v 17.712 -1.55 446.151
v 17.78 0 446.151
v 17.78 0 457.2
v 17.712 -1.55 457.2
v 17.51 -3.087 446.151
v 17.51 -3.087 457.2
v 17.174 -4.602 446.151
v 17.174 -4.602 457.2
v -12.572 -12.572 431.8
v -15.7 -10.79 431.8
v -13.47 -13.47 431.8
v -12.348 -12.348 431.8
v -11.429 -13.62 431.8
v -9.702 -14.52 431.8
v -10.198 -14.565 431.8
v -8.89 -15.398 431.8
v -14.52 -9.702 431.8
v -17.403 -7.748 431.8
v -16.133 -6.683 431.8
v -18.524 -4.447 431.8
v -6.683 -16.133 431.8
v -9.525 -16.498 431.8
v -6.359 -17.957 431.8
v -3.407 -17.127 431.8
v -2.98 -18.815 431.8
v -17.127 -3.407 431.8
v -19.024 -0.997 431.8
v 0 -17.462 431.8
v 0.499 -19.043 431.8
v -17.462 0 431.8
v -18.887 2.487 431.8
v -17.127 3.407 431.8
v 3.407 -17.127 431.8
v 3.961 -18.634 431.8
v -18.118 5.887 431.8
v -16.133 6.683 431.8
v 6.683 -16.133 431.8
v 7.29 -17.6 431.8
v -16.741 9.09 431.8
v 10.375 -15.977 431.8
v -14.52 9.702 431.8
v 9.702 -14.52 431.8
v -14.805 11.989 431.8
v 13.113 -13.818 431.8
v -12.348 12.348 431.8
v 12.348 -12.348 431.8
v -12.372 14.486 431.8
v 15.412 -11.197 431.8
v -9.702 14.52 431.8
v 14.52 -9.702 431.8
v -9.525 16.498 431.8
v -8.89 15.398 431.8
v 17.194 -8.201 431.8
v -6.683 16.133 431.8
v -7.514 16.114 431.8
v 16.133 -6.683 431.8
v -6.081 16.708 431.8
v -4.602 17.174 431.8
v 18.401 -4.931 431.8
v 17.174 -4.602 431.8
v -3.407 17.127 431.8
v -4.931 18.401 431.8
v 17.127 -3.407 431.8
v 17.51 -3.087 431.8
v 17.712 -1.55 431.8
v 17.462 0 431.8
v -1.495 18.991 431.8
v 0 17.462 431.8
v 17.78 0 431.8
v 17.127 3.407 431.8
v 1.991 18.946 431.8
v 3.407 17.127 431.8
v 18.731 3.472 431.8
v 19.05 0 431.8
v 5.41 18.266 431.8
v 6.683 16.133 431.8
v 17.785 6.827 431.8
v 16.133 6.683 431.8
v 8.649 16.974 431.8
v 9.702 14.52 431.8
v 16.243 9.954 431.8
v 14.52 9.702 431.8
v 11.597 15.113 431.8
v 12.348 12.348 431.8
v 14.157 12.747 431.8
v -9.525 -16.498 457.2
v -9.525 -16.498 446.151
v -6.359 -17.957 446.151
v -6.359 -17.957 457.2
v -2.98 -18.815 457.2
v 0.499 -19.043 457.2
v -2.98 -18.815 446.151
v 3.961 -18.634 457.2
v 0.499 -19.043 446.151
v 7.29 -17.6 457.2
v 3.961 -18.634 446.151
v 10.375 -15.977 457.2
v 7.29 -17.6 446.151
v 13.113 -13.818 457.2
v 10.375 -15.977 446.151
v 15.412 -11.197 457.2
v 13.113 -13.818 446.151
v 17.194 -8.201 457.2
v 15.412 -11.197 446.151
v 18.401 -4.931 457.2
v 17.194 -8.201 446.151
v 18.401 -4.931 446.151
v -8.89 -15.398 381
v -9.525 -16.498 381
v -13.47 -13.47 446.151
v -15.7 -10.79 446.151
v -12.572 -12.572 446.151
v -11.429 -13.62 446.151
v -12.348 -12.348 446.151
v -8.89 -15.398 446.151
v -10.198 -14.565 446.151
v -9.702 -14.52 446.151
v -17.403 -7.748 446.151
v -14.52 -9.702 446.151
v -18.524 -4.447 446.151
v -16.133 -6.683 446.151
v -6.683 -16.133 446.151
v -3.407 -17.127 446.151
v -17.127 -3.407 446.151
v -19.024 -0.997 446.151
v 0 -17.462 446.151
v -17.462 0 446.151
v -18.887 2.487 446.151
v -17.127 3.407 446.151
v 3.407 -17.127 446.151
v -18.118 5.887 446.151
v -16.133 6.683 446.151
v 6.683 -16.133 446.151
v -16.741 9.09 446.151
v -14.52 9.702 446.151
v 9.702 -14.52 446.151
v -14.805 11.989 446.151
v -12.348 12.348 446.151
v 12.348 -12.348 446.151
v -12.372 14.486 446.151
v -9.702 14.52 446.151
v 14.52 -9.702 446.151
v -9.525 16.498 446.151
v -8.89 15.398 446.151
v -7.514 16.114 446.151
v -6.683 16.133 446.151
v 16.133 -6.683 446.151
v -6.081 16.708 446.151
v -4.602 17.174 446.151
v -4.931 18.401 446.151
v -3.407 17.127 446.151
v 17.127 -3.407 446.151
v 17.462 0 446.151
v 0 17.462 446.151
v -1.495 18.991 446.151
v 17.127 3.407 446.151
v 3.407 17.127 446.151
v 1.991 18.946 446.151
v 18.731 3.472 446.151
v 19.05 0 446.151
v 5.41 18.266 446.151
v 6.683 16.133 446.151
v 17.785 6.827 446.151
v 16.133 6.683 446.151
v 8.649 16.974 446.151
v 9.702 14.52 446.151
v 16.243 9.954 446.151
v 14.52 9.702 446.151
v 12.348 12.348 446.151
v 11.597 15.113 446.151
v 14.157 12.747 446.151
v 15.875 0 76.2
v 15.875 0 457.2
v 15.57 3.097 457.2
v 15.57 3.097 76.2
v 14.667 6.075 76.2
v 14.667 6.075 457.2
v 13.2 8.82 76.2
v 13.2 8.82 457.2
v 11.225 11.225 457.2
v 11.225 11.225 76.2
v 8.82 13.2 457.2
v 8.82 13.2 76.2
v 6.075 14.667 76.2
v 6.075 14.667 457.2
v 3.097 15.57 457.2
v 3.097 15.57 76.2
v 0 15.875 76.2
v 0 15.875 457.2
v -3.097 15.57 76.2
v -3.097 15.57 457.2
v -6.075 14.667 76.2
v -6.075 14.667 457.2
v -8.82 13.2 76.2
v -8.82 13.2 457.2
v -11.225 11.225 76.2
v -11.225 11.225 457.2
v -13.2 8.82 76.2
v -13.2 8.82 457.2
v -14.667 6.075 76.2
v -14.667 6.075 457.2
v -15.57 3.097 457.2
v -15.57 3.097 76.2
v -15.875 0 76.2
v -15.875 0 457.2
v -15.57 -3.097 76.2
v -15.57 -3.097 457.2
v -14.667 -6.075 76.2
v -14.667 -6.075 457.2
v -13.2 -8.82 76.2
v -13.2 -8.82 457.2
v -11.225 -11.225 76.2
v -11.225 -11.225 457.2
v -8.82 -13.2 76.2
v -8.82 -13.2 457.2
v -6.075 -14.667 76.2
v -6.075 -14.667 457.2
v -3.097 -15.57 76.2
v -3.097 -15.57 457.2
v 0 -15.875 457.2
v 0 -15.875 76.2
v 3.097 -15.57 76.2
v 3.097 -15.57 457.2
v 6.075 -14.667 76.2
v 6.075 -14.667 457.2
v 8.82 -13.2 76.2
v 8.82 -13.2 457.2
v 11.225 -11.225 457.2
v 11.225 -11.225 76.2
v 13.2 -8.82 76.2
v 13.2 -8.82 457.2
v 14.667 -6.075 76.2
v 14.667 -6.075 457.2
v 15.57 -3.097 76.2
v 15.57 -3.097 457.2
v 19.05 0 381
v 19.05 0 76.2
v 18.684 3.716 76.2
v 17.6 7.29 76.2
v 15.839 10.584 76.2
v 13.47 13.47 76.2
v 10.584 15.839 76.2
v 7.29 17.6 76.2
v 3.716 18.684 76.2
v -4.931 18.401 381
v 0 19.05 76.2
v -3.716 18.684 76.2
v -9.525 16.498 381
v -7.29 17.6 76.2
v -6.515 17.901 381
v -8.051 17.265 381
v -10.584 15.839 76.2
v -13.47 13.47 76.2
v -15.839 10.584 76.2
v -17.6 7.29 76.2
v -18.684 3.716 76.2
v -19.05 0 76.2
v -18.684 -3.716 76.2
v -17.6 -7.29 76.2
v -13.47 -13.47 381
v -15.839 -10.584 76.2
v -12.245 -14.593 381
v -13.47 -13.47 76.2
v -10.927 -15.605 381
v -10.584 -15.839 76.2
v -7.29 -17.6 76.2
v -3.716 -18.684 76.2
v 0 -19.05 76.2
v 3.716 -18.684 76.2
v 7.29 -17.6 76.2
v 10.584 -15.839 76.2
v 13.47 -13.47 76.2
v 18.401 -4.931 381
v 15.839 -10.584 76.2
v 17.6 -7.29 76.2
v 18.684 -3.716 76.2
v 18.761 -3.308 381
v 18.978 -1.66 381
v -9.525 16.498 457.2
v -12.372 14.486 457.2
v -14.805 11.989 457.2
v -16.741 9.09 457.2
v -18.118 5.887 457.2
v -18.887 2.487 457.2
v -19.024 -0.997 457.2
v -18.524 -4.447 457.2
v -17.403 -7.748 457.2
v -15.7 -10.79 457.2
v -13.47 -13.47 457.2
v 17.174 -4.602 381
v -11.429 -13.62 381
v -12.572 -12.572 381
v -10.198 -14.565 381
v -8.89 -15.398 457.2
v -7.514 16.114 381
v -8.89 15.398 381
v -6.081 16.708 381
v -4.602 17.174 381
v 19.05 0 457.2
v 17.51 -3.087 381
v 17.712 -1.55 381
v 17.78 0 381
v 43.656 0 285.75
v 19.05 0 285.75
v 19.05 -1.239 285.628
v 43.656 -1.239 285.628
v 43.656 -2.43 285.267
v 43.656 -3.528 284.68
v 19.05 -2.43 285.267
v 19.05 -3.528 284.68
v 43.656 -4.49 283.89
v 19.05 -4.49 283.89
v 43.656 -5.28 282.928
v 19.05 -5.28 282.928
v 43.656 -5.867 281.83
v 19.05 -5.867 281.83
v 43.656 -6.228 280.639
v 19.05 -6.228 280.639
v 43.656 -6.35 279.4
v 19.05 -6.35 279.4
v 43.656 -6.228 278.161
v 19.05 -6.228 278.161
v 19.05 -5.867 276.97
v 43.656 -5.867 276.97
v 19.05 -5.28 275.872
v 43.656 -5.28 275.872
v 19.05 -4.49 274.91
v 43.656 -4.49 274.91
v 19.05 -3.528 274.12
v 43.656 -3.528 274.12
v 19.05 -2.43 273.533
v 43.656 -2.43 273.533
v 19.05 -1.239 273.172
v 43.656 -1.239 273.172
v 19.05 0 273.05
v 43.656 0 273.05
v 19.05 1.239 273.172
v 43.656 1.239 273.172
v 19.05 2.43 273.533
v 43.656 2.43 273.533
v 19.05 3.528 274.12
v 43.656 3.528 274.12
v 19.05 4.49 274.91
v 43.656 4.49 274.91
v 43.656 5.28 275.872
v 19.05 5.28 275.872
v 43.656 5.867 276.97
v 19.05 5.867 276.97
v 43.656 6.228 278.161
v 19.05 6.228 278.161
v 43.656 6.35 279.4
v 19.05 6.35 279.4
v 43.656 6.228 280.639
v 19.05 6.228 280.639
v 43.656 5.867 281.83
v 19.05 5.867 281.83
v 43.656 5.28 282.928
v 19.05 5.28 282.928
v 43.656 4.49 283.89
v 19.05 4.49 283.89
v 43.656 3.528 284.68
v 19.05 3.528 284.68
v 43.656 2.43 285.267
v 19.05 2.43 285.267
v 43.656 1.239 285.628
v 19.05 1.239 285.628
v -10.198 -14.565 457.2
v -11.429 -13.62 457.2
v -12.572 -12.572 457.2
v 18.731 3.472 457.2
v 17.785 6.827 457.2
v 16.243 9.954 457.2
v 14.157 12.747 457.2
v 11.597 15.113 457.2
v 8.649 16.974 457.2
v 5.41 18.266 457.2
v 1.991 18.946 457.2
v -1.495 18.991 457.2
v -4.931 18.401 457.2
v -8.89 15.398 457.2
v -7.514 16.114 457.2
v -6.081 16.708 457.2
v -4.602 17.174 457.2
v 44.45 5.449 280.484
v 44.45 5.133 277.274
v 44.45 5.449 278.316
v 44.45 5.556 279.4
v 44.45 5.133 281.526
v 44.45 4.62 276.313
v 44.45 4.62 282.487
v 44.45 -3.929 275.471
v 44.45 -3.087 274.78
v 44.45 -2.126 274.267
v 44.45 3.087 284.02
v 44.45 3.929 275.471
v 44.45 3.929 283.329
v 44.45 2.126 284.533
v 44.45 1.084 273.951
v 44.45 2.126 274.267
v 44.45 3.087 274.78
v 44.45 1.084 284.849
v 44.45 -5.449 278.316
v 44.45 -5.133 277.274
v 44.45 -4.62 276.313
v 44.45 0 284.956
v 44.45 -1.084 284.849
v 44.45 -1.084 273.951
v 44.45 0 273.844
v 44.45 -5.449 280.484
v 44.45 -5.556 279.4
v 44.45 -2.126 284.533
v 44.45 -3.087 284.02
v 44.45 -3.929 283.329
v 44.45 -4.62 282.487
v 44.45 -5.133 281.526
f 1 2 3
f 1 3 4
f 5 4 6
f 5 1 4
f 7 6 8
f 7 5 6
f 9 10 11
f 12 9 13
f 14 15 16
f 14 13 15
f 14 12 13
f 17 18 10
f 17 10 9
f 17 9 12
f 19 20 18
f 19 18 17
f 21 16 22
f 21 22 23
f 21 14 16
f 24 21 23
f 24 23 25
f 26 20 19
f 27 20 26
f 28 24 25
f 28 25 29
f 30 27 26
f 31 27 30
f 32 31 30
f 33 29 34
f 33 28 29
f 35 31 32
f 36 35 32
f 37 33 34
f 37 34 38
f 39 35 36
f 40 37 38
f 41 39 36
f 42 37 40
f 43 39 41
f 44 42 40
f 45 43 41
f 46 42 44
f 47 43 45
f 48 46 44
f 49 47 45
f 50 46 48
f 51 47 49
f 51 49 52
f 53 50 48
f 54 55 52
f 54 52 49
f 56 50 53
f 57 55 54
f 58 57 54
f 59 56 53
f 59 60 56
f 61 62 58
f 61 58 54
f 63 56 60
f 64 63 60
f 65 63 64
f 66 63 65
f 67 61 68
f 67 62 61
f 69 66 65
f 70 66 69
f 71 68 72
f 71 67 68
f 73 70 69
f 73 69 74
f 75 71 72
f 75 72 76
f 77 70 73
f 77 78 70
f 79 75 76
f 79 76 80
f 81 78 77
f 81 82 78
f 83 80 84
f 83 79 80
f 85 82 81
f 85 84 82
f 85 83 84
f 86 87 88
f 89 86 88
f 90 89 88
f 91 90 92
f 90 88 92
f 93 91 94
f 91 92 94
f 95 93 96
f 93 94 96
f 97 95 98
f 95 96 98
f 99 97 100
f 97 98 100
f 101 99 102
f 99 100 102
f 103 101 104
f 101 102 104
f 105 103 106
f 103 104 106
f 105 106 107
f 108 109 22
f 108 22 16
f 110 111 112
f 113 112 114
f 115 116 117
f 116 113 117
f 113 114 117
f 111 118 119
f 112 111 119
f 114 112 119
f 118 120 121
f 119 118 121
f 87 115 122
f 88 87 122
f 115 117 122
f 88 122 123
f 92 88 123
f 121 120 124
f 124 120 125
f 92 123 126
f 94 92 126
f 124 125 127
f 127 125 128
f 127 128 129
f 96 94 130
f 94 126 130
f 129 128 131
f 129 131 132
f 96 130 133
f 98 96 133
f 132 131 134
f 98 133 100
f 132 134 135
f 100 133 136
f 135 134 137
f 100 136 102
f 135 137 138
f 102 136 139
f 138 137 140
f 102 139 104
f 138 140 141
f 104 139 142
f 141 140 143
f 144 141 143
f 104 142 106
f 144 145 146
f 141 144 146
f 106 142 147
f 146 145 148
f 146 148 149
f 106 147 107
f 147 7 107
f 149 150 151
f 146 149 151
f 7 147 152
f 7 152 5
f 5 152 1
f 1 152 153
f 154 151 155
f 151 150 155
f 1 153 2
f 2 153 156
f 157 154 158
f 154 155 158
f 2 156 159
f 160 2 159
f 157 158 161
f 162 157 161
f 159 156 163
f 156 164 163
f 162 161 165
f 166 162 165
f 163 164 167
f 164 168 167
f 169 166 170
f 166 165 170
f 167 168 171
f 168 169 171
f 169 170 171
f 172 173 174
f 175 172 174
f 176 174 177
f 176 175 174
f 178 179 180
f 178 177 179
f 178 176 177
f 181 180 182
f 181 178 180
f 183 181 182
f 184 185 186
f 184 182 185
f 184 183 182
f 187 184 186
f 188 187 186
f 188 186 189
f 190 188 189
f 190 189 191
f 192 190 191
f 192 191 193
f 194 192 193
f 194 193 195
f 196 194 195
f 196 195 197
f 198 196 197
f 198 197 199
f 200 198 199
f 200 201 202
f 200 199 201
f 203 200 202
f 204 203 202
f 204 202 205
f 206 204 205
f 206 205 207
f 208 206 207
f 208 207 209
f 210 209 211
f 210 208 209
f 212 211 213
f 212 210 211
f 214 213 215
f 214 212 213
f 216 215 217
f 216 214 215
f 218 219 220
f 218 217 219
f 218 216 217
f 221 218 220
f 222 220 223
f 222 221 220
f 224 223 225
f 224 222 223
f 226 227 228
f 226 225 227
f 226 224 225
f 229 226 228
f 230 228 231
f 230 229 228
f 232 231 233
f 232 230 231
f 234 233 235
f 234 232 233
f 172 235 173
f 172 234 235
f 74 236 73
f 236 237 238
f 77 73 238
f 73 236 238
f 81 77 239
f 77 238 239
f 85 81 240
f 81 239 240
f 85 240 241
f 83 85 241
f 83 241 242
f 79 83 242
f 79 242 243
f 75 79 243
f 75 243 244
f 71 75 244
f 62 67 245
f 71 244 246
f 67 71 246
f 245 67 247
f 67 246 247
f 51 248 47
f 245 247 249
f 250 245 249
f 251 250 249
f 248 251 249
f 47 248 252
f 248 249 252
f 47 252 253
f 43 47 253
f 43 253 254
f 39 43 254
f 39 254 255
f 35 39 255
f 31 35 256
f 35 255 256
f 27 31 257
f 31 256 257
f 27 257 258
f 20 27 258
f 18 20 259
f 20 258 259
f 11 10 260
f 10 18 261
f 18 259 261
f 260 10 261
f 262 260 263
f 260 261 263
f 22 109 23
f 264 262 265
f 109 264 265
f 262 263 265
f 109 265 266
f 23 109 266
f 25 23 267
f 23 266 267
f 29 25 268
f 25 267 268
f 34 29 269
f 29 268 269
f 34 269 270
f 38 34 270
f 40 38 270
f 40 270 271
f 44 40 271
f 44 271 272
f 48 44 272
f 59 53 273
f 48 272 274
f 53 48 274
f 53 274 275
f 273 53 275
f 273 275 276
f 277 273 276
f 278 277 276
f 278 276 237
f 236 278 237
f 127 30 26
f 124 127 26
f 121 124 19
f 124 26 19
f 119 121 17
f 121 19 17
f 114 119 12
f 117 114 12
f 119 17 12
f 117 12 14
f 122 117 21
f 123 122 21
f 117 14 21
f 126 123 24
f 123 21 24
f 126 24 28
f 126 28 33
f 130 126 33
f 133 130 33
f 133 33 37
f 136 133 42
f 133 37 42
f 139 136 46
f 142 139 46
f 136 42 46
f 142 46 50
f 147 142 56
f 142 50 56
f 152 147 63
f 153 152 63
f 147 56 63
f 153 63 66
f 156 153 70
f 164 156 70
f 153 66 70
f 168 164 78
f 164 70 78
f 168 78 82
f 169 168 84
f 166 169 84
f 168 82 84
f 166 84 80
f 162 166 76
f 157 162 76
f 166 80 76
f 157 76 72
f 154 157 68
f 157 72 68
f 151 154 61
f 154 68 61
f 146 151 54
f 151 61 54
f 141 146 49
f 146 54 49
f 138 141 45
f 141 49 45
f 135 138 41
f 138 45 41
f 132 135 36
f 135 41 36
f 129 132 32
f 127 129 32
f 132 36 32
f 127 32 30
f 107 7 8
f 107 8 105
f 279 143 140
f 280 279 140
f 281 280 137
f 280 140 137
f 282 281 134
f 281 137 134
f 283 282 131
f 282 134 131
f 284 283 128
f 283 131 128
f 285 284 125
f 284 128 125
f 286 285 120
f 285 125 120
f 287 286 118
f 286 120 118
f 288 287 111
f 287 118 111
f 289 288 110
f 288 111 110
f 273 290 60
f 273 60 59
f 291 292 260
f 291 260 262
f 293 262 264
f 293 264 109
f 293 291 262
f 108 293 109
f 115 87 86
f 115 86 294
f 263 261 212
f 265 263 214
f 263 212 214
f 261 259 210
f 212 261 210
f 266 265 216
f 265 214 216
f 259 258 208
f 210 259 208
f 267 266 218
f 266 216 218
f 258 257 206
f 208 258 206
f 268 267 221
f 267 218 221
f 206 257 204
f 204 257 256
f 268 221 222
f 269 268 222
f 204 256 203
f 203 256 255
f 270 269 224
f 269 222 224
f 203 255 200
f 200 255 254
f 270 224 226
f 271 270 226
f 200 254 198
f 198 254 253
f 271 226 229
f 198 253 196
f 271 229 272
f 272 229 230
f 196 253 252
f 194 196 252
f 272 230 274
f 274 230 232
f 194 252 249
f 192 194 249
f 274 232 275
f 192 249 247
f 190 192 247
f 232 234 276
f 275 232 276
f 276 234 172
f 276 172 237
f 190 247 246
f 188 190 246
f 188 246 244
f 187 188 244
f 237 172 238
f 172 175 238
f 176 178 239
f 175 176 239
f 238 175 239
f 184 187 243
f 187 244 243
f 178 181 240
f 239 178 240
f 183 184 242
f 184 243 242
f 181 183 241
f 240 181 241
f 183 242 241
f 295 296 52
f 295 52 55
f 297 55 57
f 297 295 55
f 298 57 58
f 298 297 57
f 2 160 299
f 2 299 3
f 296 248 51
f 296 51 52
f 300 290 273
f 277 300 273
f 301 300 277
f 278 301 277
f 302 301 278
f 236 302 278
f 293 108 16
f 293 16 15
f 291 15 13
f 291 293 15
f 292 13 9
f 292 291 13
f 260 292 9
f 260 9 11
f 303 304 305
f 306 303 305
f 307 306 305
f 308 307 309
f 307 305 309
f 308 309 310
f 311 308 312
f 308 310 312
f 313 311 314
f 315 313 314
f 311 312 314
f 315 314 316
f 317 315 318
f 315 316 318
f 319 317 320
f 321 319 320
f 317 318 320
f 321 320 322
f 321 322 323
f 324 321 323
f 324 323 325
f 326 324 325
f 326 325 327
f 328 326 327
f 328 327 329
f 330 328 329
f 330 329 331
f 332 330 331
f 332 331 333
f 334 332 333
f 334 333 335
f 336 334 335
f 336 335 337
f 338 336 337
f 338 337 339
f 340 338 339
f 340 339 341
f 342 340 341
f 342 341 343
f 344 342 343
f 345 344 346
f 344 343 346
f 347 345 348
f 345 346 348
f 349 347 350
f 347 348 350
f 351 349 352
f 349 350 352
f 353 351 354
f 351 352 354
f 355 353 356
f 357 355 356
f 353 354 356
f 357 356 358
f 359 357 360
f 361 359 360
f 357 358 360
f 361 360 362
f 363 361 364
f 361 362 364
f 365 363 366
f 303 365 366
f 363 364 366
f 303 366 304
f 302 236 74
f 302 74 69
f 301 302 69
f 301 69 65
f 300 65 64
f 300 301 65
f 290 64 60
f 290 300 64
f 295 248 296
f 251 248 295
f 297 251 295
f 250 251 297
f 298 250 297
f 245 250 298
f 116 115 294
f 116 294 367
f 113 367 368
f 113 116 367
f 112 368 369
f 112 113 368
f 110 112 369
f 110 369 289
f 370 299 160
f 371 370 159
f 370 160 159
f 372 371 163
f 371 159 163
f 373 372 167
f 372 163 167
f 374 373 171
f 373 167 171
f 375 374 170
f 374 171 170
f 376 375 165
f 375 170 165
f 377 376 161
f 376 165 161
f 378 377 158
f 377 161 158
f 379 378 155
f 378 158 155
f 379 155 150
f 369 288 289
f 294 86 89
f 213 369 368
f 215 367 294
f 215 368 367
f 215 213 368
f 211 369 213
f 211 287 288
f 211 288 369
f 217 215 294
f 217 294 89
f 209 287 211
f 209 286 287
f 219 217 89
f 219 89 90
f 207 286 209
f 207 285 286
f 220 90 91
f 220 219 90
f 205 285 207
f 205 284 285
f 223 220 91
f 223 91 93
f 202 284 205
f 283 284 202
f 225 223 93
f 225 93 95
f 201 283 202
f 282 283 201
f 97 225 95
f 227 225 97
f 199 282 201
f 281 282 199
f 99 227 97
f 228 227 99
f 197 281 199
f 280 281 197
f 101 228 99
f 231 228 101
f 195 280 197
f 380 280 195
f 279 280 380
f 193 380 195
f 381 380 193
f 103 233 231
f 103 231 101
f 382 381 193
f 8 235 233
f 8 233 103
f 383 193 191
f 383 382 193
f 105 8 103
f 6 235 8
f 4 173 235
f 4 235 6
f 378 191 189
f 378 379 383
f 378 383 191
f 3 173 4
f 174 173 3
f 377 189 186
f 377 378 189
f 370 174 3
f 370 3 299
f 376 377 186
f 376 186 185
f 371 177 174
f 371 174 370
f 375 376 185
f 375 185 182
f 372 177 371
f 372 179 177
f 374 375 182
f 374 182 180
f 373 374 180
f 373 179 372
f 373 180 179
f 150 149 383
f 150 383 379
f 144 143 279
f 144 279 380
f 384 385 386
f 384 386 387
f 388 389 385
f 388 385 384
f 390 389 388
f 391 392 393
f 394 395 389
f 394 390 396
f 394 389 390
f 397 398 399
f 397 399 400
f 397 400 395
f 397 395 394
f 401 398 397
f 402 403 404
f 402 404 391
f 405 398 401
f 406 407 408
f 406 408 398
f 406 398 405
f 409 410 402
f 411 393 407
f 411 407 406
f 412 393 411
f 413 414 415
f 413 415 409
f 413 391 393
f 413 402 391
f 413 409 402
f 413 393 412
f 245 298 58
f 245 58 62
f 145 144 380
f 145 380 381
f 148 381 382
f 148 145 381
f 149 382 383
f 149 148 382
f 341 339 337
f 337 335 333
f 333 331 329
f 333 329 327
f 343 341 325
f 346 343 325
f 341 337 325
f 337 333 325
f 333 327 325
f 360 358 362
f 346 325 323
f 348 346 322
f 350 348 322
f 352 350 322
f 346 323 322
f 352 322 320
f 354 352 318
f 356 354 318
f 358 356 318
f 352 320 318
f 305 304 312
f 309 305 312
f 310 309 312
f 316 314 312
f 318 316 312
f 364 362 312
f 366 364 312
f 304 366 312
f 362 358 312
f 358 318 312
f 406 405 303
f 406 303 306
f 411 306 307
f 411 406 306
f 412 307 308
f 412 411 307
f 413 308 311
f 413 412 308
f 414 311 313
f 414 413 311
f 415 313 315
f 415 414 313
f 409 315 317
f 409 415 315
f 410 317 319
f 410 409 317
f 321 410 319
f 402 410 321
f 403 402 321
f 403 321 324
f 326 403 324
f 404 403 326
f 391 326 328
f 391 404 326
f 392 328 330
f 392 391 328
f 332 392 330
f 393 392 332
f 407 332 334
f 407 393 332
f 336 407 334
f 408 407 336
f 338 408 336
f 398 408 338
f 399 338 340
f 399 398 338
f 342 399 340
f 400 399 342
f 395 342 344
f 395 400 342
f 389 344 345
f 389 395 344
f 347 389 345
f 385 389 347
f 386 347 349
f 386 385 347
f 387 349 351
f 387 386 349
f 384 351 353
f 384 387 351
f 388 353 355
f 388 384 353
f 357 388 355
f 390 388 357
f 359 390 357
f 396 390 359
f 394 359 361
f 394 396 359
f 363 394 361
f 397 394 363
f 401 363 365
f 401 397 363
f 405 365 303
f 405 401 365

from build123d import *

# Parameters (mm, degrees)
SKETCH1_R             = 19.05
SKETCH1_R_2           = 15.875
EXTRUDE_1968T51_DEPTH = 914.4
SKETCH2_R             = 19.05
CUT_EXTRUDE1_DEPTH    = 76.2
SKETCH3_R             = 6.35
EXTRUDE_9061K36_DEPTH = 304.8
SKETCH5_R             = 6.35
CUT_EXTRUDE3_DEPTH    = 279.4
CHAMFER1_SIZE         = 0.79375
CUT_EXTRUDE4_START    = -457.2
SKETCH6_R             = 19.05
CUT_EXTRUDE4_DEPTH    = 457.2
CUT_EXTRUDE5_START    = -76.2
CUT_EXTRUDE5_DEPTH    = 76.2
CUT_EXTRUDE6_START    = -25.4
SKETCH8_R             = 19.05
SKETCH8_R_2           = 17.4625
CUT_EXTRUDE6_DEPTH    = 14.351


with BuildPart() as part:
    # Sketch1 → Extrude 1968T51 (new body)
    with BuildSketch(Plane.XY):
        Circle(SKETCH1_R)
        Circle(SKETCH1_R_2, mode=Mode.SUBTRACT)
    extrude(amount=EXTRUDE_1968T51_DEPTH)

    # Sketch2 → Cut-Extrude1 (cut)
    with BuildSketch(Plane.XY):
        Circle(SKETCH2_R)
    extrude(amount=CUT_EXTRUDE1_DEPTH, mode=Mode.SUBTRACT)

    # Sketch6 → Cut-Extrude4 (cut)
    with BuildSketch(Plane.XY.offset(914.4).offset(CUT_EXTRUDE4_START)):
        Circle(SKETCH6_R)
    extrude(amount=CUT_EXTRUDE4_DEPTH, mode=Mode.SUBTRACT)

    # Sketch7 → Cut-Extrude5 (cut)
    with BuildSketch(Plane.XY.offset(457.2).offset(CUT_EXTRUDE5_START)):
        with BuildLine():
            Line((19.05, 0), (17.78, 0))
            ThreePointArc((17.78, 0), (17.627889635, -2.320755698), (17.174161191, -4.601802622))
            Line((17.174161191, -4.601802622), (18.400886991, -4.930502809))
            ThreePointArc((18.400886991, -4.930502809), (18.887024609, -2.486523962), (19.05, 0))
        make_face()
        with BuildLine():
            Line((-9.525, -16.497783942), (-8.89, -15.397931679))
            ThreePointArc((-8.89, -15.397931679), (-10.823778208, -14.10582239), (-12.572358569, -12.572358569))
            Line((-12.572358569, -12.572358569), (-13.470384182, -13.470384182))
            ThreePointArc((-13.470384182, -13.470384182), (-11.596905223, -15.113381133), (-9.525, -16.497783942))
        make_face()
        with BuildLine():
            Line((-9.525, 16.497783942), (-8.89, 15.397931679))
            ThreePointArc((-8.89, 15.397931679), (-6.804111427, 16.426578088), (-4.601802622, 17.174161191))
            Line((-4.601802622, 17.174161191), (-4.930502809, 18.400886991))
            ThreePointArc((-4.930502809, 18.400886991), (-7.290119387, 17.599905094), (-9.525, 16.497783942))
        make_face()
    extrude(amount=CUT_EXTRUDE5_DEPTH, mode=Mode.SUBTRACT)

    # Sketch8 → Cut-Extrude6 (cut)
    with BuildSketch(Plane.XY.offset(457.2).offset(CUT_EXTRUDE6_START)):
        Circle(SKETCH8_R)
        with Locations(Location((0, 0, 0), (0, 0, 180))):
            Circle(SKETCH8_R_2, mode=Mode.SUBTRACT)
    extrude(amount=CUT_EXTRUDE6_DEPTH, mode=Mode.SUBTRACT)


with BuildPart() as body_2:
    # Sketch3 → Extrude 9061K36 (new body)
    with BuildSketch(Plane(origin=(19.05, 0, 0), x_dir=(0, 0, -1), z_dir=(1, 0, 0))):
        with Locations(Location((-279.4, 0, 0), (0, 0, 180))):
            Circle(SKETCH3_R)
    extrude(amount=EXTRUDE_9061K36_DEPTH)

    # Sketch5 → Cut-Extrude3 (cut)
    with BuildSketch(Plane(origin=(323.85, 0, 0), x_dir=(0, 0, -1), z_dir=(1, 0, 0))):
        with Locations(Location((-279.4, 0, 0), (0, 0, 180))):
            Circle(SKETCH5_R)
    extrude(amount=-CUT_EXTRUDE3_DEPTH, mode=Mode.SUBTRACT)

    # Chamfer1
    chamfer1_edges = [body_2.edges().sort_by_distance(p)[0] for p in [
        (44.45, 0, 273.05),
    ]]
    chamfer(chamfer1_edges, length=CHAMFER1_SIZE)


solid = Compound([part.part, body_2.part])
